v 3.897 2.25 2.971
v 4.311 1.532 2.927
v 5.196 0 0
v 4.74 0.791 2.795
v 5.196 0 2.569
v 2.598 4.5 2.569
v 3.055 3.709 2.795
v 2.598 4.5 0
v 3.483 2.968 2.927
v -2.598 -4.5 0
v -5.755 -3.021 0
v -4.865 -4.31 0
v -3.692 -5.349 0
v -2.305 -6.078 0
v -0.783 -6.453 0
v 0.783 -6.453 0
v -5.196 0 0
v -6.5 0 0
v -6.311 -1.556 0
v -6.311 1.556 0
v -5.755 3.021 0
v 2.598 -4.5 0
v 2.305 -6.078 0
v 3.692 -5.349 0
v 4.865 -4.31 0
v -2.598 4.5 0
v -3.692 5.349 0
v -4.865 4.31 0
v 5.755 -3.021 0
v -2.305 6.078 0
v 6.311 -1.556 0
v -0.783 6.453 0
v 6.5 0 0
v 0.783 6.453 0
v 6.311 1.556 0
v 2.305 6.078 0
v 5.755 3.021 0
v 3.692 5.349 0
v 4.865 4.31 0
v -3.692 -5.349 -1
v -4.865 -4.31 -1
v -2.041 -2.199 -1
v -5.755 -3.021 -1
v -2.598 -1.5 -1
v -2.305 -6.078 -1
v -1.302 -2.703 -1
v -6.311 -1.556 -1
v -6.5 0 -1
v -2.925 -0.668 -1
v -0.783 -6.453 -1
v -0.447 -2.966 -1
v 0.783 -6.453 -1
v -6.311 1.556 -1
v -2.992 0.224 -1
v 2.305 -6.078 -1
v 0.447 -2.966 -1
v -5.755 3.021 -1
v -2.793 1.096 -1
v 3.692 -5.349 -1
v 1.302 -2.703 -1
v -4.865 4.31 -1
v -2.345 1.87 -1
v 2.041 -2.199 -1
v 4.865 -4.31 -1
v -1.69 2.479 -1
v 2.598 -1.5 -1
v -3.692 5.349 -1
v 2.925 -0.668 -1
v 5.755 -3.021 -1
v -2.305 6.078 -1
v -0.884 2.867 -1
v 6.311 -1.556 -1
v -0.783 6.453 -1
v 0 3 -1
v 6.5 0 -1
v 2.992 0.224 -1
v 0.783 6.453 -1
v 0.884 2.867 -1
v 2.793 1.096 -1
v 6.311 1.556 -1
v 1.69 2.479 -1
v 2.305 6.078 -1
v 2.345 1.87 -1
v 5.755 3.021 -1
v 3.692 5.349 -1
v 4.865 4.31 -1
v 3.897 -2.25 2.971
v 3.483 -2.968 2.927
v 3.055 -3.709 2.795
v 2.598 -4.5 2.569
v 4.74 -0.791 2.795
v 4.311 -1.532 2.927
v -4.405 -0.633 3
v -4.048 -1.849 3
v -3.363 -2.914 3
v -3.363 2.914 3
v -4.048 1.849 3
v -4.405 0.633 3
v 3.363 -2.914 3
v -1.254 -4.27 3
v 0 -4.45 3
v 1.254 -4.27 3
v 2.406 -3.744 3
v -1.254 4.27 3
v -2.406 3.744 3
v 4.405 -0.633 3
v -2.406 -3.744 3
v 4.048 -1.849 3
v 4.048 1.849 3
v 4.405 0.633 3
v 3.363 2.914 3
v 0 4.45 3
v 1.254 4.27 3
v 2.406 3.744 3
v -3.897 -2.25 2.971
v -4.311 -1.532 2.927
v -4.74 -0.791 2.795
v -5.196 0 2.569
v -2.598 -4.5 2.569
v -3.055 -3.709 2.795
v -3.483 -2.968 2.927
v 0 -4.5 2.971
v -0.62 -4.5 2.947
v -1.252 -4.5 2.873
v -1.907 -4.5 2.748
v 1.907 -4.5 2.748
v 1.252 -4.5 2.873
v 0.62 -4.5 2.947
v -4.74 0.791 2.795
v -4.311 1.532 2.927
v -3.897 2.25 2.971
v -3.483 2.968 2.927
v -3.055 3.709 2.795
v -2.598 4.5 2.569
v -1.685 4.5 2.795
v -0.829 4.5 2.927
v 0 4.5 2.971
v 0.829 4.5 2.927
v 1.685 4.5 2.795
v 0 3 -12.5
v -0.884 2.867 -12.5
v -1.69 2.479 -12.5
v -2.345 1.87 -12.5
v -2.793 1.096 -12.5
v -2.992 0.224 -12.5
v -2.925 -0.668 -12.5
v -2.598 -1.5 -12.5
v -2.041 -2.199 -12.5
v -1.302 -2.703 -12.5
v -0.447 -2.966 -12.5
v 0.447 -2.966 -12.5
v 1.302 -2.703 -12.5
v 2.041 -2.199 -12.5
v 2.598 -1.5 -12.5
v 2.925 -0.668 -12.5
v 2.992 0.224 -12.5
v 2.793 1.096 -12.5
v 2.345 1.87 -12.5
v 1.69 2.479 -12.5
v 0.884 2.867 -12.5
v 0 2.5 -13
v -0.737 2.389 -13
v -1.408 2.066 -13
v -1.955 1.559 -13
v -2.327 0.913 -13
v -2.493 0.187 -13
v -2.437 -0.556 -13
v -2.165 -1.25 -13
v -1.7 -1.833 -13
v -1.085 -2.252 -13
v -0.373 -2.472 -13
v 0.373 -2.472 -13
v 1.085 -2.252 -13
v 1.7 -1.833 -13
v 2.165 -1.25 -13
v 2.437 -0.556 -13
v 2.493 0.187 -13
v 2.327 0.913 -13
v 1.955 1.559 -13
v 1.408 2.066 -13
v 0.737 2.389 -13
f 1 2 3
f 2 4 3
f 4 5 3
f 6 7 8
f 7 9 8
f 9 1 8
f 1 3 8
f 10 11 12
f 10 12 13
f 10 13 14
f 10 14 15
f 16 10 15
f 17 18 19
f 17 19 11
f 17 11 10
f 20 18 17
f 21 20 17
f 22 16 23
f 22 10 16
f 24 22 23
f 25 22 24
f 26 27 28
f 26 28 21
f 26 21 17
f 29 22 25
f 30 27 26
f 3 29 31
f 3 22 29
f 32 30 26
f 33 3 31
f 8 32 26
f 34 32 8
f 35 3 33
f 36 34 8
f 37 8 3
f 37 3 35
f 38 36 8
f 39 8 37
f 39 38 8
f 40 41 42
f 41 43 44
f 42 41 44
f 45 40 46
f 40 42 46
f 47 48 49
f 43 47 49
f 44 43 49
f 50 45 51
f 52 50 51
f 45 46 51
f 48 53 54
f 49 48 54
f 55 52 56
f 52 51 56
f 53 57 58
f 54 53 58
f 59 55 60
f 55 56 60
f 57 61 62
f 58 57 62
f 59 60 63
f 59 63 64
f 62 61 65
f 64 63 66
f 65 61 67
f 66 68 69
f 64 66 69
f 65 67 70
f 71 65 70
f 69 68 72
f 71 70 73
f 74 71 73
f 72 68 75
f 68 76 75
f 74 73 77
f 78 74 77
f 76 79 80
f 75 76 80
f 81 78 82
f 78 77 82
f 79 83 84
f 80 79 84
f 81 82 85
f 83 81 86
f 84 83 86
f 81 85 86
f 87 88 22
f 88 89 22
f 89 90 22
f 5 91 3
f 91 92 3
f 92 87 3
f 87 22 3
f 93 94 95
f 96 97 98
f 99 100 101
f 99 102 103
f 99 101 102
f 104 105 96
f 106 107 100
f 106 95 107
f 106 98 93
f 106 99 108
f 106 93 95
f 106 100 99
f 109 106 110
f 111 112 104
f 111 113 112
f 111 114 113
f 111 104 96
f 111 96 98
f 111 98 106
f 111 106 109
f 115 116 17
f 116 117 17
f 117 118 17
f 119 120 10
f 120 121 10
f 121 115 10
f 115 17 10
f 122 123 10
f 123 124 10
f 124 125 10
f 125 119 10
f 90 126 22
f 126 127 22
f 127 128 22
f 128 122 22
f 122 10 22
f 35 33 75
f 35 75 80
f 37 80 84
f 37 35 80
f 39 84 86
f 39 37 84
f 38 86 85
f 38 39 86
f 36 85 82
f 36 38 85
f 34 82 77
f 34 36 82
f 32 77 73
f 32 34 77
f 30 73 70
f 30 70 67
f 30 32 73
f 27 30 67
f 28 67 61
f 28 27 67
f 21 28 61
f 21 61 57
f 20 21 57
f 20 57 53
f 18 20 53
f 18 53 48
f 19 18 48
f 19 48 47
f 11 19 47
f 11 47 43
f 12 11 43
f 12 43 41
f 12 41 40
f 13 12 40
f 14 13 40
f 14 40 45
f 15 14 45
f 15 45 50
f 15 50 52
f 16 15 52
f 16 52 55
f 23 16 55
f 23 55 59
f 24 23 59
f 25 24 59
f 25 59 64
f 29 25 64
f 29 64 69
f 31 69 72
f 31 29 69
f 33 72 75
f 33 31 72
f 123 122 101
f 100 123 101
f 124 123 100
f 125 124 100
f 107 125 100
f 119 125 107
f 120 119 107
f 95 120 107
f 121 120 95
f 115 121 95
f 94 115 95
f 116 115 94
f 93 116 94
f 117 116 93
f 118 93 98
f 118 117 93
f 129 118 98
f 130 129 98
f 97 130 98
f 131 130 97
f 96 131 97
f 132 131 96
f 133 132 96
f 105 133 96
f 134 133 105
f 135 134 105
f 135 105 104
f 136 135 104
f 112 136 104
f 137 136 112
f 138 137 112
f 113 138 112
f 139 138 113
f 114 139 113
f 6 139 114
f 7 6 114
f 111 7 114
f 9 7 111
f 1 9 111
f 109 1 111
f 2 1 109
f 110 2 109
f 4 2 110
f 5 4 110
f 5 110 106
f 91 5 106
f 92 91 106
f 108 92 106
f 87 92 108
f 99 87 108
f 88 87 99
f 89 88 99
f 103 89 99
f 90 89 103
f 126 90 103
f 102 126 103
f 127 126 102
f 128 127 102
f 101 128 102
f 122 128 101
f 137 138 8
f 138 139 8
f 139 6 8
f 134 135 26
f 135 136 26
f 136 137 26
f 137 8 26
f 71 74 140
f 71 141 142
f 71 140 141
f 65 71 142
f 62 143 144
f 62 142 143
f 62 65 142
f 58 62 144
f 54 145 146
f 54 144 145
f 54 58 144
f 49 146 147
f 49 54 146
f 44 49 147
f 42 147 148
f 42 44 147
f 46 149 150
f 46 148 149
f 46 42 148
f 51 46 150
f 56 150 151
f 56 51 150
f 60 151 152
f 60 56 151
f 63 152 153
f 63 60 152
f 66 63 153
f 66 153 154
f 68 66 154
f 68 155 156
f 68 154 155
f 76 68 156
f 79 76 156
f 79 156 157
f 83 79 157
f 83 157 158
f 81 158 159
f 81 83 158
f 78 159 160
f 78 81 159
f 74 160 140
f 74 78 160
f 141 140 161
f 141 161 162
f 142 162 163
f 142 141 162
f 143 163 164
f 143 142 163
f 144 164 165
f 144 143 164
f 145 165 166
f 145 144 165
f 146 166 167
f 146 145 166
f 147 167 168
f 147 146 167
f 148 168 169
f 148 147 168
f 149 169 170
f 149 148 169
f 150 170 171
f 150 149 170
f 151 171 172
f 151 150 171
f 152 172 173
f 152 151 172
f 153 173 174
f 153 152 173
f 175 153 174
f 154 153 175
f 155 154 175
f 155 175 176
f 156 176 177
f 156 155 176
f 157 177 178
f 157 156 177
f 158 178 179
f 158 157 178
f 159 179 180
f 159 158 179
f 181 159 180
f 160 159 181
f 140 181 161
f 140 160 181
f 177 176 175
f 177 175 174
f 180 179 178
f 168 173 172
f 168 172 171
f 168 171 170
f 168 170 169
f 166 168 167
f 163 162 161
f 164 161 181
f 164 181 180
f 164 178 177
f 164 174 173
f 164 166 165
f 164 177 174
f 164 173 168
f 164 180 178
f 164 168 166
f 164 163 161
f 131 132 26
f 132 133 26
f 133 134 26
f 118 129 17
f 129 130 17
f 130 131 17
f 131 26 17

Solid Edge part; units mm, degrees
sketch "Sketch1" plane through (0, 0, 0) normal (0, 0, 1) x (1, 0, 0)
  circle A0 centre (0, 0) radius 6.5
  dimension "D1" = 13
extrude "Protrusion1" add sketch "Sketch1" against normal blind 1
sketch "Sketch2" plane through (0, 0, 0) normal (0, 0, 1) x (1, 0, 0)
  line L0 (2.5981, 4.5) -> (-2.5981, 4.5)
  line L1 (-2.5981, 4.5) -> (-5.1962, 0)
  line L2 (-5.1962, 0) -> (-2.5981, -4.5)
  line L3 (-2.5981, -4.5) -> (2.5981, -4.5)
  line L4 (2.5981, -4.5) -> (5.1962, 0)
  line L5 (5.1962, 0) -> (2.5981, 4.5)
  dimension "D1" = 4.5
  dimension "D2" = 9
extrude "Protrusion2" add sketch "Sketch2" along normal blind 3
sketch "Sketch3" plane through (0, 0, 0) normal (1, 0, 0) x (0, 1, 0)
  line L0 (-4.45, 3) -> (-7.9141, 1)
  dimension "D1" = 4
revolve "RevolvedCutout1" cut sketch "Sketch3" angle 360 about axis through (0, 0, 2.5) along (0, 0, -1) material side at (0, -6.2071, 2.0433)
sketch "Sketch4" plane through (0, 0, -1) normal (0, 0, -1) x (0, 1, 0)
  circle A0 centre (0, 0) radius 3
  dimension "D1" = 6
extrude "Protrusion3" add sketch "Sketch4" along normal blind 12
chamfer "Chamfer1" distance 0.5 angle 45 1 edges at (0, -3, -13)
properties part number "WHB-6X12" material "STEEL"
